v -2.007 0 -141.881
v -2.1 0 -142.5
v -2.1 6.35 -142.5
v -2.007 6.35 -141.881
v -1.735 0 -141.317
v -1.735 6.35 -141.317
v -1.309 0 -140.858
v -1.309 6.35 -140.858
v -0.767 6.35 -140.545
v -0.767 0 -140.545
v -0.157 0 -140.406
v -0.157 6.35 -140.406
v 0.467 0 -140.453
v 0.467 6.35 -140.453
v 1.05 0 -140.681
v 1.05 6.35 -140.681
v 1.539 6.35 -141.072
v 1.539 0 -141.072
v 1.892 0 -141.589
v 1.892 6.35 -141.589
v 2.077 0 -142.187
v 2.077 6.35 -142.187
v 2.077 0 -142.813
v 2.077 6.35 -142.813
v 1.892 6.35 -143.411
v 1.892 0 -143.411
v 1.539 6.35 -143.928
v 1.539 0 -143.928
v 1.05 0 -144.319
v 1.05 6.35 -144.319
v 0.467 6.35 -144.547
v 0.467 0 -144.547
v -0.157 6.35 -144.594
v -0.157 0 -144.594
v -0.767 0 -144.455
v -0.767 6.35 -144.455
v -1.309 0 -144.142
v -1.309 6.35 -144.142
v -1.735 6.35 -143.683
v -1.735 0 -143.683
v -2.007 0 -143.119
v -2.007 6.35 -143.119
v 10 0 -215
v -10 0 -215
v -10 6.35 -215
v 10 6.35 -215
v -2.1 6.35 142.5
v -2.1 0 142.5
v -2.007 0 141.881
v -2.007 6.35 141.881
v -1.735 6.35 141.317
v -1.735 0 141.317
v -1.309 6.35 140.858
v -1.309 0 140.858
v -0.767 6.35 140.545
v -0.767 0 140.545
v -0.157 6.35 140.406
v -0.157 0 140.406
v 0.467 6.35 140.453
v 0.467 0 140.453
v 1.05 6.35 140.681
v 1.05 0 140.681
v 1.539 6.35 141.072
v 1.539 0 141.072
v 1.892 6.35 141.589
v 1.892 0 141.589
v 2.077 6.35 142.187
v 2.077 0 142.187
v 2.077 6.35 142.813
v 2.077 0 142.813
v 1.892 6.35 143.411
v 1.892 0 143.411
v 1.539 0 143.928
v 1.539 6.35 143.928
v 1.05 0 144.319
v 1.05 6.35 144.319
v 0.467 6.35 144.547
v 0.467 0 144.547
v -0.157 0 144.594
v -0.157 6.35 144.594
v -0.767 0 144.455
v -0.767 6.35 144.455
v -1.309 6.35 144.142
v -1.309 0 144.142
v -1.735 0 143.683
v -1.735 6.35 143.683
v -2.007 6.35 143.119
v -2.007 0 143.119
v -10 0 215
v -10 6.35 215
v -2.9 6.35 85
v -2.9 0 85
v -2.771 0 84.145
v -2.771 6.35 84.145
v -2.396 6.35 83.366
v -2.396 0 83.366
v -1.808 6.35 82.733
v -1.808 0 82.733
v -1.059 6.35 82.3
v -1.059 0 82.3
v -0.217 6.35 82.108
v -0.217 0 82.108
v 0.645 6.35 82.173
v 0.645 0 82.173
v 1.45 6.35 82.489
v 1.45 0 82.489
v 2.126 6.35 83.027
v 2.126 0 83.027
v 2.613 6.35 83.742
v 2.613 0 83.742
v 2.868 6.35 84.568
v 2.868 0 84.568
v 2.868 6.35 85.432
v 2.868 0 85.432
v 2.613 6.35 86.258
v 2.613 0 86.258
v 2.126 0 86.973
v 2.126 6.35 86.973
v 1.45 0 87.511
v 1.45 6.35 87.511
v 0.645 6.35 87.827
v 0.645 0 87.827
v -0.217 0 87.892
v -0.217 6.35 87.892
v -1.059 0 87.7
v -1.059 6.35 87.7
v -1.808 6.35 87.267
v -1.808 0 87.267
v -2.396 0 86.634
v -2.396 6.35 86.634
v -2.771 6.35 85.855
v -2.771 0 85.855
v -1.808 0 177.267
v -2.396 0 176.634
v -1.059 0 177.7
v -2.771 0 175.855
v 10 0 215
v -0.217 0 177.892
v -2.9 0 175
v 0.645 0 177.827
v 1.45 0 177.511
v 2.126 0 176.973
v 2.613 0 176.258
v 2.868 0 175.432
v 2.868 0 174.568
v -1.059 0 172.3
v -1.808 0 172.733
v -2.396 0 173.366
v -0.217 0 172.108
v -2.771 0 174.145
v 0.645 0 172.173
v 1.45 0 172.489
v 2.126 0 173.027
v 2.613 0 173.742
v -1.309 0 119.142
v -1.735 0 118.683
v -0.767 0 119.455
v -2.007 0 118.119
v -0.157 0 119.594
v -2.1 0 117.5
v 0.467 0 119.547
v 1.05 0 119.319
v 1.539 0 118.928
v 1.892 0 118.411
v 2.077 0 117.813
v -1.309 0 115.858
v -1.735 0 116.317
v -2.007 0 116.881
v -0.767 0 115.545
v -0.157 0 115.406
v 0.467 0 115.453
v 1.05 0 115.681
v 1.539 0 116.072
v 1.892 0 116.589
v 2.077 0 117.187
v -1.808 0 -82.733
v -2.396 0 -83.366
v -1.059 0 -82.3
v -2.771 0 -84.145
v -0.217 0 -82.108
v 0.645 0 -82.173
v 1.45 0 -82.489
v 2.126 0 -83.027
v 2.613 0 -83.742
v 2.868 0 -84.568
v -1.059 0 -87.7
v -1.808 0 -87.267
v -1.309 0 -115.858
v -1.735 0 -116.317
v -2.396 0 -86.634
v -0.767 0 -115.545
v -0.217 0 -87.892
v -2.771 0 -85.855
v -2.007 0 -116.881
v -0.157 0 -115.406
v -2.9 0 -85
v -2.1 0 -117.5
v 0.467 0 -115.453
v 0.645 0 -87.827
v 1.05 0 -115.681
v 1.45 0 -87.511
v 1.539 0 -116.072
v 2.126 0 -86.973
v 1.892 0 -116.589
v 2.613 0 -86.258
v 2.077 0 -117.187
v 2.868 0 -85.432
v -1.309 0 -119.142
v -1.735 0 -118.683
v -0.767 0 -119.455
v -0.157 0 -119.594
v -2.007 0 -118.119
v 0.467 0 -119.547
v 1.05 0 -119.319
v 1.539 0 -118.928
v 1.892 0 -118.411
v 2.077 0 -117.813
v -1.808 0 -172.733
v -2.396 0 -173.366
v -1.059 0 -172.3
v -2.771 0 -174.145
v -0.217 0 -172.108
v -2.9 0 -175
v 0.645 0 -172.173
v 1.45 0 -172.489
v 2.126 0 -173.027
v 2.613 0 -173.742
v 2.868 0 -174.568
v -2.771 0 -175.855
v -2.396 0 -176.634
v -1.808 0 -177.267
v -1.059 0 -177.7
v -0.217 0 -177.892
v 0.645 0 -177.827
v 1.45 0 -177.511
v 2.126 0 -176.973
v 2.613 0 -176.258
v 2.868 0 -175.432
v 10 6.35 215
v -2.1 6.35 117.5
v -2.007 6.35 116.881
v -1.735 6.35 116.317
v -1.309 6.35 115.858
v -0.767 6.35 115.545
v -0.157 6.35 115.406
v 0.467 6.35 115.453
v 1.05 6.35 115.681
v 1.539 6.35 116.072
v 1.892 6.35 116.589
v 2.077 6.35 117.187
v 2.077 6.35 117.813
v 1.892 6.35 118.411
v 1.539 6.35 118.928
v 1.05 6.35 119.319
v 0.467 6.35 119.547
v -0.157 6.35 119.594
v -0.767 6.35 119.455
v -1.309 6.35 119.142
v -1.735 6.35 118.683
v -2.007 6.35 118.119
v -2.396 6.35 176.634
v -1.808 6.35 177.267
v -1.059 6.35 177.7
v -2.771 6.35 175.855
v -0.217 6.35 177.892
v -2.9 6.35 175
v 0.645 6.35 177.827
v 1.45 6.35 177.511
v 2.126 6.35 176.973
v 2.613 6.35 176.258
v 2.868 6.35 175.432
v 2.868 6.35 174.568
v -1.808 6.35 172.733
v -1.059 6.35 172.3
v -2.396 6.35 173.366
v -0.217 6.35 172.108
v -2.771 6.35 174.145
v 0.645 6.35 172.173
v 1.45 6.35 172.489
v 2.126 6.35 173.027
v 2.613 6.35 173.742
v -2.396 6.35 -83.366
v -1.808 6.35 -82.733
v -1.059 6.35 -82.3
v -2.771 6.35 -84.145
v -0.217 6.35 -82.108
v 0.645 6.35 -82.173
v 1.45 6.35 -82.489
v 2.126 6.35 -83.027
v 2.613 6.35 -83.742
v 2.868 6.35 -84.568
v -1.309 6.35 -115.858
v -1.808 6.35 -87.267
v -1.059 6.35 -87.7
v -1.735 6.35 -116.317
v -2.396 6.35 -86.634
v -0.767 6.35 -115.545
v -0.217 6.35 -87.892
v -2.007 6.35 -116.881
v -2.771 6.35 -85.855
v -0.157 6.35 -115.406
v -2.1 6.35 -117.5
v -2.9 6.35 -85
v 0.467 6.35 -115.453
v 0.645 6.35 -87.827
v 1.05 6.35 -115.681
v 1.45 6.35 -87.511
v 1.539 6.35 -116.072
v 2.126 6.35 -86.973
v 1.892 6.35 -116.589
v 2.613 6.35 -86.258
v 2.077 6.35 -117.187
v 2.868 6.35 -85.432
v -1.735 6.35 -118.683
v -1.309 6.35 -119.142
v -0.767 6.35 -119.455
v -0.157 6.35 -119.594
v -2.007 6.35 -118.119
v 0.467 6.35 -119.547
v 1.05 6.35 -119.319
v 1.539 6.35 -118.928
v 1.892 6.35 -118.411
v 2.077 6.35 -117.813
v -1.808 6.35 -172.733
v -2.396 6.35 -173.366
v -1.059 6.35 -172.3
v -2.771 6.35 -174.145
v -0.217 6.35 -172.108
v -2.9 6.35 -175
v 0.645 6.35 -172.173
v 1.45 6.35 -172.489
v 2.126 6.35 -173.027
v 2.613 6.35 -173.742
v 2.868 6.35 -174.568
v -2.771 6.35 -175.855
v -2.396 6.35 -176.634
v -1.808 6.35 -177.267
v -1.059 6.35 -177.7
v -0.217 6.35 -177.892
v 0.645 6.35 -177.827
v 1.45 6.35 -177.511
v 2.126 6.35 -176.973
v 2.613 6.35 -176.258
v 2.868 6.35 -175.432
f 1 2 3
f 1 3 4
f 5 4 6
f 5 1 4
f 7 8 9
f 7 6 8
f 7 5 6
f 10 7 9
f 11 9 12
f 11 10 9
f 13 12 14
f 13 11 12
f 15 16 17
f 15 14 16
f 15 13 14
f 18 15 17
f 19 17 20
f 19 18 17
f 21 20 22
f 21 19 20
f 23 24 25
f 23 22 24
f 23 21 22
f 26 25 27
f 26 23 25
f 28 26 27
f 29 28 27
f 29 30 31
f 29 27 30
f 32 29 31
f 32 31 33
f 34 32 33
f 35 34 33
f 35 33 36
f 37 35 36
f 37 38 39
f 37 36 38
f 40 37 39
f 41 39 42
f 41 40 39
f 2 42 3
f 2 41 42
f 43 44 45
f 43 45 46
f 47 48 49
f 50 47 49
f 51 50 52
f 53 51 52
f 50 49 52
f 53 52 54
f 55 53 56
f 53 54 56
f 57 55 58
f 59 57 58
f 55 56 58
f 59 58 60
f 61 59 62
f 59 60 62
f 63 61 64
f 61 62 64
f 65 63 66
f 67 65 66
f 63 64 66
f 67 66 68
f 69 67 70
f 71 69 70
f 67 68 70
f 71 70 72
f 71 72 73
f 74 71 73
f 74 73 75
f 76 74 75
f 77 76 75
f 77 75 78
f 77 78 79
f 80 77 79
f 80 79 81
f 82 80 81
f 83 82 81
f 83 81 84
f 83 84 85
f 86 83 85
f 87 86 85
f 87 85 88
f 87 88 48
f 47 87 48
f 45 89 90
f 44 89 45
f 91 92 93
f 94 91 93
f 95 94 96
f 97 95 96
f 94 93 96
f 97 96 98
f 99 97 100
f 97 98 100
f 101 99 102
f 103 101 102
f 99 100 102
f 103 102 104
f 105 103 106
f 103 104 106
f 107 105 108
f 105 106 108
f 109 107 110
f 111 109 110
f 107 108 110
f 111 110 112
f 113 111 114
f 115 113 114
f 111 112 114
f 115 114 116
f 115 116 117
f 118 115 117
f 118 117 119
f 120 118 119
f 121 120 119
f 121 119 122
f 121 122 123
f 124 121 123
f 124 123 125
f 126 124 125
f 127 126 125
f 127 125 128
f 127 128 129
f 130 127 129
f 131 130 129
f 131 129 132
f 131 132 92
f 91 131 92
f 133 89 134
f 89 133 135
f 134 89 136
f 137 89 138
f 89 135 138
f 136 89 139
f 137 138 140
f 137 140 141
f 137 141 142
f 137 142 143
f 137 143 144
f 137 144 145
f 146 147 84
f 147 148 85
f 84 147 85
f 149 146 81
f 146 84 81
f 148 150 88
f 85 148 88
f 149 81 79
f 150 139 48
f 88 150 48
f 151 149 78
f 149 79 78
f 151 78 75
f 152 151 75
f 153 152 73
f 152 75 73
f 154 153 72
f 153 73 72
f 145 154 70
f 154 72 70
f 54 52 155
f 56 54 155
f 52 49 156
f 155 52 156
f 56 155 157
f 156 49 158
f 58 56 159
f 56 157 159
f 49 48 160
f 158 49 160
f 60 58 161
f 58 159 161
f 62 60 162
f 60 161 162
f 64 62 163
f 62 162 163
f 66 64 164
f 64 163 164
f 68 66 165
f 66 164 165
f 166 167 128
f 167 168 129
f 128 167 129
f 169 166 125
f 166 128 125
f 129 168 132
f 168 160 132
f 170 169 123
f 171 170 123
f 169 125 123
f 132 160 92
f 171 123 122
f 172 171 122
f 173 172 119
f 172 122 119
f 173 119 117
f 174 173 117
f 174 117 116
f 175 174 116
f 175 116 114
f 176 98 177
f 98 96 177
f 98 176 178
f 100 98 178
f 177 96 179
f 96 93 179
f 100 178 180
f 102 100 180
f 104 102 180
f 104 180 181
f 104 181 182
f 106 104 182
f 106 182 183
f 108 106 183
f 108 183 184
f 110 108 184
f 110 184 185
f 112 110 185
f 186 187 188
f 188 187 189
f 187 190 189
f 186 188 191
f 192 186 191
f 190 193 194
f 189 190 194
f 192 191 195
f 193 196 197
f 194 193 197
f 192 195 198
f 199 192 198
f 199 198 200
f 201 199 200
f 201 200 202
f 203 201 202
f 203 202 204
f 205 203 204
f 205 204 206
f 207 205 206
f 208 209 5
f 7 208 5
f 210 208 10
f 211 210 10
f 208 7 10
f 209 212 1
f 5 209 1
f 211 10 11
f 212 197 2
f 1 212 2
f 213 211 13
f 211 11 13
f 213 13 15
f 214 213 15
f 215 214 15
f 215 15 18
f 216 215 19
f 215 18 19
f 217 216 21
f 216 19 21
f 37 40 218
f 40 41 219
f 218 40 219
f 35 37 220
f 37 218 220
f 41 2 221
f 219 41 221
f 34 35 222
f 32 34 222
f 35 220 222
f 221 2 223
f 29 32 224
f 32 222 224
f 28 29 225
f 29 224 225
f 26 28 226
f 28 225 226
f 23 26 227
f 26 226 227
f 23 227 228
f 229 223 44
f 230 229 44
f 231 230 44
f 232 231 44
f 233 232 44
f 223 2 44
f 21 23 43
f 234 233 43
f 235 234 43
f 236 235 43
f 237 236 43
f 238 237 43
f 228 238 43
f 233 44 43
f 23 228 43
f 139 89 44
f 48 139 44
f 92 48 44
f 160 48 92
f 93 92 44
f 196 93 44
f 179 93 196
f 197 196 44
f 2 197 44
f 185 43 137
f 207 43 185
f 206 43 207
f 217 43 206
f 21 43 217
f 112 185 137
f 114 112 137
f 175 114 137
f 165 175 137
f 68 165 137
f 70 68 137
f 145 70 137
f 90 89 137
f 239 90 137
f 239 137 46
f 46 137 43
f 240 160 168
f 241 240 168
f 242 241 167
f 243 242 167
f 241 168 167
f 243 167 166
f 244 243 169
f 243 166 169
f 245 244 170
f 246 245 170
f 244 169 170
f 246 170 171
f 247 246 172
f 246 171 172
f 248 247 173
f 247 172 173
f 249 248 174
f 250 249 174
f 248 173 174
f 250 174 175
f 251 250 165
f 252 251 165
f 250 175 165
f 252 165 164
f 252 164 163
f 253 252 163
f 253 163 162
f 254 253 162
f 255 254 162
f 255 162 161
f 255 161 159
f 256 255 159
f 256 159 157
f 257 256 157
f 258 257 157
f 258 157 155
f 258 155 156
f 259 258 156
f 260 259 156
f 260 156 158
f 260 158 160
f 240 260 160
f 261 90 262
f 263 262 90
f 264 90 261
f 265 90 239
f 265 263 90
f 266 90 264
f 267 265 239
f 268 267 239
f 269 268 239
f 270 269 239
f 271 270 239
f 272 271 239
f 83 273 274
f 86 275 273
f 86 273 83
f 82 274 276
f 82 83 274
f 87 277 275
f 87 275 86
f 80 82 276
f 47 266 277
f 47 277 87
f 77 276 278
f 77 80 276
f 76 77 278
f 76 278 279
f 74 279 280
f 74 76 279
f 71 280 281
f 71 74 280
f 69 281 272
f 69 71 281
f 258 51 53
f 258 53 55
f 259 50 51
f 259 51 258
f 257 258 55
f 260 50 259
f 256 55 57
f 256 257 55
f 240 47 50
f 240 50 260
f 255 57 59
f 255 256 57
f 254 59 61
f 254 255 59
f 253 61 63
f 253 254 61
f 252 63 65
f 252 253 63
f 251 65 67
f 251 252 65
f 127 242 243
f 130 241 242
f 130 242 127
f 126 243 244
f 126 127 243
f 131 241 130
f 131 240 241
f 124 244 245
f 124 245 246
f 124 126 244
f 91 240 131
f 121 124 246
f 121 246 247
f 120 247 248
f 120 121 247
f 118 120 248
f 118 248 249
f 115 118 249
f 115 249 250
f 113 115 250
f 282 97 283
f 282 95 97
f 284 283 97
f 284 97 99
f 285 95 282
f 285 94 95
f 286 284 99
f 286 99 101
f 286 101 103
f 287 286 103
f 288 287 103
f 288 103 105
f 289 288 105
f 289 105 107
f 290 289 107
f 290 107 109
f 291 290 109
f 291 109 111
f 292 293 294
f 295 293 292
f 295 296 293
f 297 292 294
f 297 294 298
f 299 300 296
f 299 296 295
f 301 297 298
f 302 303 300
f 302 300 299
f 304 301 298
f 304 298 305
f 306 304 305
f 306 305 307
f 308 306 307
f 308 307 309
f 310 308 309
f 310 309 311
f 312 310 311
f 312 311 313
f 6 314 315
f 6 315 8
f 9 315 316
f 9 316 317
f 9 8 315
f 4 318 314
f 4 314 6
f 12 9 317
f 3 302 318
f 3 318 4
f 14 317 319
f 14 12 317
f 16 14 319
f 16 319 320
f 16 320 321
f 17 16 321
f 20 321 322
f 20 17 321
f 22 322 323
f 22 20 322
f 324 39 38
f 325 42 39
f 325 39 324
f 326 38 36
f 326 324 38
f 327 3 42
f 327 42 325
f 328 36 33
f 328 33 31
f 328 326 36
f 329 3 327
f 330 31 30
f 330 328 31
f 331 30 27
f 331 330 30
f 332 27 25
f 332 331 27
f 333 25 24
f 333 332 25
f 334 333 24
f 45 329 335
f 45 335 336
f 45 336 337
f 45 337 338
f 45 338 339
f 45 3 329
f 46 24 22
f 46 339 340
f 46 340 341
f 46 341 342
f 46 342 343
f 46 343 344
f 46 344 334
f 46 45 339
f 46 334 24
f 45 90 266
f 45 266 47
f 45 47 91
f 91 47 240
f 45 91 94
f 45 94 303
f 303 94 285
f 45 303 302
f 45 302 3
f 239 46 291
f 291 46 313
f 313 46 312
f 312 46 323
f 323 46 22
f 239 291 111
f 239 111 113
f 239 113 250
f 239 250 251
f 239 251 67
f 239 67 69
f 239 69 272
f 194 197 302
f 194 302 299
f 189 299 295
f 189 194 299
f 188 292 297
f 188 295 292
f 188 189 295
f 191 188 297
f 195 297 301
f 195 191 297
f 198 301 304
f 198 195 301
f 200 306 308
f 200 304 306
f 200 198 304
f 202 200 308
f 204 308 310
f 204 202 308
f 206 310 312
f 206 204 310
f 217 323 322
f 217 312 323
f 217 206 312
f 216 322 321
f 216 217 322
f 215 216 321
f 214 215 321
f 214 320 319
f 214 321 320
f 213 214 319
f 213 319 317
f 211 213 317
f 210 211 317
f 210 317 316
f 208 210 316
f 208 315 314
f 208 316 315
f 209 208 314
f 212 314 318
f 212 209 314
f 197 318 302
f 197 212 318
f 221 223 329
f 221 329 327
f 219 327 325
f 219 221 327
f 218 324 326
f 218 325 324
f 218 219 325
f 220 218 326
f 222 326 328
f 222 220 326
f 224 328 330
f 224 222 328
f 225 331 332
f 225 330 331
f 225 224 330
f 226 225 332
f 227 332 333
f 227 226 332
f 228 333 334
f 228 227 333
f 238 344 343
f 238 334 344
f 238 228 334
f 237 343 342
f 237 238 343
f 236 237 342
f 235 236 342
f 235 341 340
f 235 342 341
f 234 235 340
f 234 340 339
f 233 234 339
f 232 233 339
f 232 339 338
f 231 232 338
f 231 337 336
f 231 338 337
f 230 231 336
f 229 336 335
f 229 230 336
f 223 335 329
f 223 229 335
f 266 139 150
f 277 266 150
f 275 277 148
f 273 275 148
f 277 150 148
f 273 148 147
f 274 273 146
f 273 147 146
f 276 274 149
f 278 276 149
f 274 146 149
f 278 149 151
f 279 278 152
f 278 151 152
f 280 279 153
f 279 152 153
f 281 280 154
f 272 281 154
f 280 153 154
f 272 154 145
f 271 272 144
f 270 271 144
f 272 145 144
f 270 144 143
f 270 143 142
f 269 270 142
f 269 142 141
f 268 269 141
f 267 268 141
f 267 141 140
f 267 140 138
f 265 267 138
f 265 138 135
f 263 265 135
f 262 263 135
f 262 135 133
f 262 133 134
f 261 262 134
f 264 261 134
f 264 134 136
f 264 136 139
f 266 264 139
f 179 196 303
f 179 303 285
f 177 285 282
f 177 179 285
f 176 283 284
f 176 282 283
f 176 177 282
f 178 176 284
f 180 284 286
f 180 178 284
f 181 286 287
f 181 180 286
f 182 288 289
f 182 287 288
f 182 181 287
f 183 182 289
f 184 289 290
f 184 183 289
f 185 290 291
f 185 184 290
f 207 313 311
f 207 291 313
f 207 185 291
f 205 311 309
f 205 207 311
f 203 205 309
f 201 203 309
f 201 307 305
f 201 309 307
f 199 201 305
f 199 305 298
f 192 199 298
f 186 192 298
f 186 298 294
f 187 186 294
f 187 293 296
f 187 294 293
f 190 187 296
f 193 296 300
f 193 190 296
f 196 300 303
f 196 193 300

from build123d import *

# Parameters (mm, degrees)
SKETCH1_W             = 20
SKETCH1_H             = 430
BOSS_EXTRUDE1_DEPTH   = 6.35
M5_CLEARANCE_HOLE1_D  = 5.8
M5X0_8_TAPPED_HOLE1_D = 4.2


with BuildPart() as part:
    # Sketch1 → Boss-Extrude1 (new body)
    with BuildSketch(Plane(origin=(0, 0, 0), x_dir=(1, 0, 0), z_dir=(0, 1, 0))):
        Rectangle(SKETCH1_W, SKETCH1_H)
    extrude(amount=BOSS_EXTRUDE1_DEPTH)

    # M5 Clearance Hole1 (through all)
    with Locations(Plane(origin=(0, 6.35, 0), x_dir=(1, 0, 0), z_dir=(0, 1, 0))):
        with Locations((0, -175), (0, -85)):
            m5_clearance_hole1 = Hole(M5_CLEARANCE_HOLE1_D / 2)

    # Mirror1: M5 Clearance Hole1 across plane
    add(m5_clearance_hole1.mirror(Plane.XY), mode=Mode.SUBTRACT)

    # M5x0.8 Tapped Hole1 (through all)
    with Locations(Plane(origin=(0, 6.35, 0), x_dir=(1, 0, 0), z_dir=(0, 1, 0))):
        with Locations((0, -142.5), (0, -117.5)):
            m5x0_8_tapped_hole1 = Hole(M5X0_8_TAPPED_HOLE1_D / 2)

    # Mirror2: M5x0.8 Tapped Hole1 across plane
    add(m5x0_8_tapped_hole1.mirror(Plane.XY), mode=Mode.SUBTRACT)


solid = part.part
